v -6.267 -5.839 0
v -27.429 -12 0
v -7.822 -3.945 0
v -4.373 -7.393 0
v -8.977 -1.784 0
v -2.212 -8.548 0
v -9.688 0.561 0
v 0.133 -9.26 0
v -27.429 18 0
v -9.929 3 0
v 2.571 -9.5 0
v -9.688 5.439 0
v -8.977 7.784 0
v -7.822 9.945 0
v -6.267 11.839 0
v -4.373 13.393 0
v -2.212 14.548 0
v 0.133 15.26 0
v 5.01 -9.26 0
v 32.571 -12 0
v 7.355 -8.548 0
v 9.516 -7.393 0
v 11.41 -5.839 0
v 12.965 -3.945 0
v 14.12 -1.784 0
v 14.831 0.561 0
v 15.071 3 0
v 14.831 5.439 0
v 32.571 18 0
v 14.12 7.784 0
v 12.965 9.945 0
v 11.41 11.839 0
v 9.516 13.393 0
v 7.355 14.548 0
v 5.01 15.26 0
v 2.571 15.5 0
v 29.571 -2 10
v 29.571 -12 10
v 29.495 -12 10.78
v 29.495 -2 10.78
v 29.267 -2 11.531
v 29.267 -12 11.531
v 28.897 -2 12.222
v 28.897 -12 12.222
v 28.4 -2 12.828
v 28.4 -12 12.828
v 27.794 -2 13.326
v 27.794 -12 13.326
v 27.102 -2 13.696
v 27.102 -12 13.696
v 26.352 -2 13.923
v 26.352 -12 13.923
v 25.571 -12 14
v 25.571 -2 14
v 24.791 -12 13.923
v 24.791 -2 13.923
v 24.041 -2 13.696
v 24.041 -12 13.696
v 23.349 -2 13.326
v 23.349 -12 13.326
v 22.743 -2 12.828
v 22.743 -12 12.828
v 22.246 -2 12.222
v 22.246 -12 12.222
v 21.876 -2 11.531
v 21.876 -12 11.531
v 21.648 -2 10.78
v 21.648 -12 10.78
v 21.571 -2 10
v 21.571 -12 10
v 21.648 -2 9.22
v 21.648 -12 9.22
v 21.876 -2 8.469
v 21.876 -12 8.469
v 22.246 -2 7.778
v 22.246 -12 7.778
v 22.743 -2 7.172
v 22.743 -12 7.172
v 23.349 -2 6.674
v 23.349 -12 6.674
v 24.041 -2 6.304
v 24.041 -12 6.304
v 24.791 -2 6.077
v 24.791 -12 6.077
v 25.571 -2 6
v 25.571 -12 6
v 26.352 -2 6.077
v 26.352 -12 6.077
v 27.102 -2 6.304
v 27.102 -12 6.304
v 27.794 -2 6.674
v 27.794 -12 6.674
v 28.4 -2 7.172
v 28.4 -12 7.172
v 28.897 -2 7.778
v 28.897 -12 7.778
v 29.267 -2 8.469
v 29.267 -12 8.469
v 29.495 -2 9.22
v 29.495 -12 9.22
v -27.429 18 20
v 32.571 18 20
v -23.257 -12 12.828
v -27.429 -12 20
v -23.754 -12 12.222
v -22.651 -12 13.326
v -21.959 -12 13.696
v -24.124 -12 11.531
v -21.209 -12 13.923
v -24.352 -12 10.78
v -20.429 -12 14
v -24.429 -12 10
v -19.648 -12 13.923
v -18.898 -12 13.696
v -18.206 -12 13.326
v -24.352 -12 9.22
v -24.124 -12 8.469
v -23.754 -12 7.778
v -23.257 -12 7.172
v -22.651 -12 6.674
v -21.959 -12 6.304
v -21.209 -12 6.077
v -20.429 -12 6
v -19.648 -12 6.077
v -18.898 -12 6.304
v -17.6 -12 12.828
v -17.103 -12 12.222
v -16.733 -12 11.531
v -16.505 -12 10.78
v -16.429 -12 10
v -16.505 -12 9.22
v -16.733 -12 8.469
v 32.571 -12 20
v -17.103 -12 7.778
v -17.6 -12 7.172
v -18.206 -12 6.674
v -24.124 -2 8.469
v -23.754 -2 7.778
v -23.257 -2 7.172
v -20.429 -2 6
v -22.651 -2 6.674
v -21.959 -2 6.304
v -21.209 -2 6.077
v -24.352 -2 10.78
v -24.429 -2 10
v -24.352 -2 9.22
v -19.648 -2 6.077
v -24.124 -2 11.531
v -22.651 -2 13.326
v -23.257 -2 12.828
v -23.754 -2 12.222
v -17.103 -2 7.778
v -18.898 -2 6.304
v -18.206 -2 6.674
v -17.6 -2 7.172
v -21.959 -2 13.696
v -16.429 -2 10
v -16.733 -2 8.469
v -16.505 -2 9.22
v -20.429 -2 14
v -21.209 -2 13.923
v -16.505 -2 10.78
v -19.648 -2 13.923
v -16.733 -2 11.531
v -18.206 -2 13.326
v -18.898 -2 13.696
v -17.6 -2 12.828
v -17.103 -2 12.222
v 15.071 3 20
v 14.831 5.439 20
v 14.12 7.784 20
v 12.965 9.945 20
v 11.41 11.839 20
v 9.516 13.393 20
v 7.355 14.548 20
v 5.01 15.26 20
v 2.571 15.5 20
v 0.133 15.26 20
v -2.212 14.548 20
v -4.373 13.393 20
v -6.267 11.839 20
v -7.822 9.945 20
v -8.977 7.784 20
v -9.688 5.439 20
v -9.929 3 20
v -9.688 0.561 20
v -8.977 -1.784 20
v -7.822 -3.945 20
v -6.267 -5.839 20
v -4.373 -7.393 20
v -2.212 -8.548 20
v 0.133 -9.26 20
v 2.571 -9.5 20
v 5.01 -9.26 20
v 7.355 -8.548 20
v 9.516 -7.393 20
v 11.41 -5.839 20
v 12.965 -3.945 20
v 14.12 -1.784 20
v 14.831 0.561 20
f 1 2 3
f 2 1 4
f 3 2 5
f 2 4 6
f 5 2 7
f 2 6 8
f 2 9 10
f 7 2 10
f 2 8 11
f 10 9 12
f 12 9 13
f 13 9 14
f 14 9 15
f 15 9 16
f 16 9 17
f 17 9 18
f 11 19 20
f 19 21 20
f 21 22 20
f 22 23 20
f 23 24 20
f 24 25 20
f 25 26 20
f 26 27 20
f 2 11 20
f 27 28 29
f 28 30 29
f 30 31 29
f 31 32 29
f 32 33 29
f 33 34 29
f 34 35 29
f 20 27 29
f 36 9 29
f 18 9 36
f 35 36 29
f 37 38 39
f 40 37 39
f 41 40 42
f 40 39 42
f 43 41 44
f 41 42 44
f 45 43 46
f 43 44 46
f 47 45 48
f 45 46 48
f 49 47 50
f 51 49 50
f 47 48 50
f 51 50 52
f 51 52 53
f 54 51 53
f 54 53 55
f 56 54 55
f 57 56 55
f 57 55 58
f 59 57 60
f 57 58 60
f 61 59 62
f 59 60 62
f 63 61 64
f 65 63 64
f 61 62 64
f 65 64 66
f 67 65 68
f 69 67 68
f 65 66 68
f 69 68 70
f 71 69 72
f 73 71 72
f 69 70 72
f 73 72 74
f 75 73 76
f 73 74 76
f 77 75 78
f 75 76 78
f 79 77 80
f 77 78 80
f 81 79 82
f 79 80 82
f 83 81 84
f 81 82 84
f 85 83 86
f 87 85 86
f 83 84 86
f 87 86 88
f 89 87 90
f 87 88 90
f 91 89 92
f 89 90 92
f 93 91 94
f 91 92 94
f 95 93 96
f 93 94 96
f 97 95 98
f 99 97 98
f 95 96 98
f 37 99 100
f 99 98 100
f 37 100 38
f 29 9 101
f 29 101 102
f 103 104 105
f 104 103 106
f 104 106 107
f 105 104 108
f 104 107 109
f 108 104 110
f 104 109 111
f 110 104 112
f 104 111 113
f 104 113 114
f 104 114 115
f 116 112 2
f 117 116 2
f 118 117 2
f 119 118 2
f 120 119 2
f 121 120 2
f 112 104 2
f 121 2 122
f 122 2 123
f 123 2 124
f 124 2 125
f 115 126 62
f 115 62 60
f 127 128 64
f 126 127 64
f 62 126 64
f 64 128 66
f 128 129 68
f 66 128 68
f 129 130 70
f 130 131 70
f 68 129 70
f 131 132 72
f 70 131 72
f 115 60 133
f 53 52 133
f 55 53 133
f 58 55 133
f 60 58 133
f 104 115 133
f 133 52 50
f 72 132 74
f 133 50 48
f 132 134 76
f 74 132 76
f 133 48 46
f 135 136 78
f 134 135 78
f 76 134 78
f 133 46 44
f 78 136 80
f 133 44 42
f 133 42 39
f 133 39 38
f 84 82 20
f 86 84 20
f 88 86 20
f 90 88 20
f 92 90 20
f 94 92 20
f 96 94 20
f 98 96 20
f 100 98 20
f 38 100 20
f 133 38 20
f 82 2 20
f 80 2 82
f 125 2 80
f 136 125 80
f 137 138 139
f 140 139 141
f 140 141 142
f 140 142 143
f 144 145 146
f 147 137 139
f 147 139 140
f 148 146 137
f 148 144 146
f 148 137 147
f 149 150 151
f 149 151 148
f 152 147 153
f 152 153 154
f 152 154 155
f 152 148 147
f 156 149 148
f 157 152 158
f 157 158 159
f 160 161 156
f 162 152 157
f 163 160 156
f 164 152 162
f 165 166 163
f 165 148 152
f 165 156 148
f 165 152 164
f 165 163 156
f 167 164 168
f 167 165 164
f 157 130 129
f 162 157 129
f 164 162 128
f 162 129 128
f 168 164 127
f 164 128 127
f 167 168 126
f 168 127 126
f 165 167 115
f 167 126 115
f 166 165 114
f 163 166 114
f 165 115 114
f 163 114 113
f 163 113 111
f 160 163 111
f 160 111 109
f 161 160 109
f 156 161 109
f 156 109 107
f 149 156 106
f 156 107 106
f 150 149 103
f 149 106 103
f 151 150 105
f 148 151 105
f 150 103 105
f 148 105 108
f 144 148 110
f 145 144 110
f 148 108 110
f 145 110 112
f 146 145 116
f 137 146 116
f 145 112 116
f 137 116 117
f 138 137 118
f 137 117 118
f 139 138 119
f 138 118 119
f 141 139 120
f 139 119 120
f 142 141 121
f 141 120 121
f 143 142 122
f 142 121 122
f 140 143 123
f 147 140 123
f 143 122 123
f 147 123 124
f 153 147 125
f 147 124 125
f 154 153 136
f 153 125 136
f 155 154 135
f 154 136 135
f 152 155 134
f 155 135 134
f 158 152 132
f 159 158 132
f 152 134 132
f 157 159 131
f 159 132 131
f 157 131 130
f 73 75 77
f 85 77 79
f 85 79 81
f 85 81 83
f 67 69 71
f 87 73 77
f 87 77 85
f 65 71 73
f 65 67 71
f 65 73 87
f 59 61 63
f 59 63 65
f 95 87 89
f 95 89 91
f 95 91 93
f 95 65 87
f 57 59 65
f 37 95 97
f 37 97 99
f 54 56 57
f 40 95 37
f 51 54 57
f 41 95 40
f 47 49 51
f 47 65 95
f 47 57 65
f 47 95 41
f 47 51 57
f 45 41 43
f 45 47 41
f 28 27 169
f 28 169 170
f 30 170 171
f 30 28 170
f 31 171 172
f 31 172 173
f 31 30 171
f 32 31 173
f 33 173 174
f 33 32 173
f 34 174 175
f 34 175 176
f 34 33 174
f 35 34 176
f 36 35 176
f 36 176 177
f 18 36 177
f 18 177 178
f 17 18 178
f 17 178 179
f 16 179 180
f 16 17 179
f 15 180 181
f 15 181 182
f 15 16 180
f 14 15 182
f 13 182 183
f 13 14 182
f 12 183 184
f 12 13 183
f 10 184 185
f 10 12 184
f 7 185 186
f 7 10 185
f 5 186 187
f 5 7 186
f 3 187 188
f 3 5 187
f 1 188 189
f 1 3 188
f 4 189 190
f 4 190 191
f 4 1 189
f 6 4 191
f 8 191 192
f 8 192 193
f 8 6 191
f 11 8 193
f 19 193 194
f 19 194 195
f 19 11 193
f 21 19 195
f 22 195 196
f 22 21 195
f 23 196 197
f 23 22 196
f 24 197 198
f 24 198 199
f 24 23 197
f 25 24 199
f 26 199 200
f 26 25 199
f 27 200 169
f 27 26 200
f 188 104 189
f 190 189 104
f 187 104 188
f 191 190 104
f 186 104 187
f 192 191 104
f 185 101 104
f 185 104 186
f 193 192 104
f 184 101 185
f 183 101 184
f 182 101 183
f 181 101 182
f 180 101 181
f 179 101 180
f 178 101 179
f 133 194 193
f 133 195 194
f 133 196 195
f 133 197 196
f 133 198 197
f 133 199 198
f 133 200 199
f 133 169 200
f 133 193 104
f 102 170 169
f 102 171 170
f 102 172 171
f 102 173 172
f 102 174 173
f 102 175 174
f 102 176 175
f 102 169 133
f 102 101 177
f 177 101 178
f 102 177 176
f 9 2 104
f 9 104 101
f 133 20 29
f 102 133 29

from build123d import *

# Parameters (mm, degrees)
SKETCH1_W           = 60
SKETCH1_H           = 30
SKETCH1_R           = 12.5
BOSS_EXTRUDE2_DEPTH = 20
SKETCH2_R           = 4
CUT_EXTRUDE1_DEPTH  = 10


with BuildPart() as part:
    # Sketch1 → Boss-Extrude2 (new body)
    with BuildSketch(Plane.XY):
        with Locations((2.571428571, 3)):
            Rectangle(SKETCH1_W, SKETCH1_H)
        with Locations((2.571428571, 3)):
            Circle(SKETCH1_R, mode=Mode.SUBTRACT)
    extrude(amount=BOSS_EXTRUDE2_DEPTH)

    # Sketch2 → Cut-Extrude1 (cut)
    with BuildSketch(Plane.XZ.offset(12)):
        with Locations((-20.428571429, 10)):
            Circle(SKETCH2_R)
        with Locations((25.571428571, 10)):
            Circle(SKETCH2_R)
    extrude(amount=-CUT_EXTRUDE1_DEPTH, mode=Mode.SUBTRACT)


solid = part.part
